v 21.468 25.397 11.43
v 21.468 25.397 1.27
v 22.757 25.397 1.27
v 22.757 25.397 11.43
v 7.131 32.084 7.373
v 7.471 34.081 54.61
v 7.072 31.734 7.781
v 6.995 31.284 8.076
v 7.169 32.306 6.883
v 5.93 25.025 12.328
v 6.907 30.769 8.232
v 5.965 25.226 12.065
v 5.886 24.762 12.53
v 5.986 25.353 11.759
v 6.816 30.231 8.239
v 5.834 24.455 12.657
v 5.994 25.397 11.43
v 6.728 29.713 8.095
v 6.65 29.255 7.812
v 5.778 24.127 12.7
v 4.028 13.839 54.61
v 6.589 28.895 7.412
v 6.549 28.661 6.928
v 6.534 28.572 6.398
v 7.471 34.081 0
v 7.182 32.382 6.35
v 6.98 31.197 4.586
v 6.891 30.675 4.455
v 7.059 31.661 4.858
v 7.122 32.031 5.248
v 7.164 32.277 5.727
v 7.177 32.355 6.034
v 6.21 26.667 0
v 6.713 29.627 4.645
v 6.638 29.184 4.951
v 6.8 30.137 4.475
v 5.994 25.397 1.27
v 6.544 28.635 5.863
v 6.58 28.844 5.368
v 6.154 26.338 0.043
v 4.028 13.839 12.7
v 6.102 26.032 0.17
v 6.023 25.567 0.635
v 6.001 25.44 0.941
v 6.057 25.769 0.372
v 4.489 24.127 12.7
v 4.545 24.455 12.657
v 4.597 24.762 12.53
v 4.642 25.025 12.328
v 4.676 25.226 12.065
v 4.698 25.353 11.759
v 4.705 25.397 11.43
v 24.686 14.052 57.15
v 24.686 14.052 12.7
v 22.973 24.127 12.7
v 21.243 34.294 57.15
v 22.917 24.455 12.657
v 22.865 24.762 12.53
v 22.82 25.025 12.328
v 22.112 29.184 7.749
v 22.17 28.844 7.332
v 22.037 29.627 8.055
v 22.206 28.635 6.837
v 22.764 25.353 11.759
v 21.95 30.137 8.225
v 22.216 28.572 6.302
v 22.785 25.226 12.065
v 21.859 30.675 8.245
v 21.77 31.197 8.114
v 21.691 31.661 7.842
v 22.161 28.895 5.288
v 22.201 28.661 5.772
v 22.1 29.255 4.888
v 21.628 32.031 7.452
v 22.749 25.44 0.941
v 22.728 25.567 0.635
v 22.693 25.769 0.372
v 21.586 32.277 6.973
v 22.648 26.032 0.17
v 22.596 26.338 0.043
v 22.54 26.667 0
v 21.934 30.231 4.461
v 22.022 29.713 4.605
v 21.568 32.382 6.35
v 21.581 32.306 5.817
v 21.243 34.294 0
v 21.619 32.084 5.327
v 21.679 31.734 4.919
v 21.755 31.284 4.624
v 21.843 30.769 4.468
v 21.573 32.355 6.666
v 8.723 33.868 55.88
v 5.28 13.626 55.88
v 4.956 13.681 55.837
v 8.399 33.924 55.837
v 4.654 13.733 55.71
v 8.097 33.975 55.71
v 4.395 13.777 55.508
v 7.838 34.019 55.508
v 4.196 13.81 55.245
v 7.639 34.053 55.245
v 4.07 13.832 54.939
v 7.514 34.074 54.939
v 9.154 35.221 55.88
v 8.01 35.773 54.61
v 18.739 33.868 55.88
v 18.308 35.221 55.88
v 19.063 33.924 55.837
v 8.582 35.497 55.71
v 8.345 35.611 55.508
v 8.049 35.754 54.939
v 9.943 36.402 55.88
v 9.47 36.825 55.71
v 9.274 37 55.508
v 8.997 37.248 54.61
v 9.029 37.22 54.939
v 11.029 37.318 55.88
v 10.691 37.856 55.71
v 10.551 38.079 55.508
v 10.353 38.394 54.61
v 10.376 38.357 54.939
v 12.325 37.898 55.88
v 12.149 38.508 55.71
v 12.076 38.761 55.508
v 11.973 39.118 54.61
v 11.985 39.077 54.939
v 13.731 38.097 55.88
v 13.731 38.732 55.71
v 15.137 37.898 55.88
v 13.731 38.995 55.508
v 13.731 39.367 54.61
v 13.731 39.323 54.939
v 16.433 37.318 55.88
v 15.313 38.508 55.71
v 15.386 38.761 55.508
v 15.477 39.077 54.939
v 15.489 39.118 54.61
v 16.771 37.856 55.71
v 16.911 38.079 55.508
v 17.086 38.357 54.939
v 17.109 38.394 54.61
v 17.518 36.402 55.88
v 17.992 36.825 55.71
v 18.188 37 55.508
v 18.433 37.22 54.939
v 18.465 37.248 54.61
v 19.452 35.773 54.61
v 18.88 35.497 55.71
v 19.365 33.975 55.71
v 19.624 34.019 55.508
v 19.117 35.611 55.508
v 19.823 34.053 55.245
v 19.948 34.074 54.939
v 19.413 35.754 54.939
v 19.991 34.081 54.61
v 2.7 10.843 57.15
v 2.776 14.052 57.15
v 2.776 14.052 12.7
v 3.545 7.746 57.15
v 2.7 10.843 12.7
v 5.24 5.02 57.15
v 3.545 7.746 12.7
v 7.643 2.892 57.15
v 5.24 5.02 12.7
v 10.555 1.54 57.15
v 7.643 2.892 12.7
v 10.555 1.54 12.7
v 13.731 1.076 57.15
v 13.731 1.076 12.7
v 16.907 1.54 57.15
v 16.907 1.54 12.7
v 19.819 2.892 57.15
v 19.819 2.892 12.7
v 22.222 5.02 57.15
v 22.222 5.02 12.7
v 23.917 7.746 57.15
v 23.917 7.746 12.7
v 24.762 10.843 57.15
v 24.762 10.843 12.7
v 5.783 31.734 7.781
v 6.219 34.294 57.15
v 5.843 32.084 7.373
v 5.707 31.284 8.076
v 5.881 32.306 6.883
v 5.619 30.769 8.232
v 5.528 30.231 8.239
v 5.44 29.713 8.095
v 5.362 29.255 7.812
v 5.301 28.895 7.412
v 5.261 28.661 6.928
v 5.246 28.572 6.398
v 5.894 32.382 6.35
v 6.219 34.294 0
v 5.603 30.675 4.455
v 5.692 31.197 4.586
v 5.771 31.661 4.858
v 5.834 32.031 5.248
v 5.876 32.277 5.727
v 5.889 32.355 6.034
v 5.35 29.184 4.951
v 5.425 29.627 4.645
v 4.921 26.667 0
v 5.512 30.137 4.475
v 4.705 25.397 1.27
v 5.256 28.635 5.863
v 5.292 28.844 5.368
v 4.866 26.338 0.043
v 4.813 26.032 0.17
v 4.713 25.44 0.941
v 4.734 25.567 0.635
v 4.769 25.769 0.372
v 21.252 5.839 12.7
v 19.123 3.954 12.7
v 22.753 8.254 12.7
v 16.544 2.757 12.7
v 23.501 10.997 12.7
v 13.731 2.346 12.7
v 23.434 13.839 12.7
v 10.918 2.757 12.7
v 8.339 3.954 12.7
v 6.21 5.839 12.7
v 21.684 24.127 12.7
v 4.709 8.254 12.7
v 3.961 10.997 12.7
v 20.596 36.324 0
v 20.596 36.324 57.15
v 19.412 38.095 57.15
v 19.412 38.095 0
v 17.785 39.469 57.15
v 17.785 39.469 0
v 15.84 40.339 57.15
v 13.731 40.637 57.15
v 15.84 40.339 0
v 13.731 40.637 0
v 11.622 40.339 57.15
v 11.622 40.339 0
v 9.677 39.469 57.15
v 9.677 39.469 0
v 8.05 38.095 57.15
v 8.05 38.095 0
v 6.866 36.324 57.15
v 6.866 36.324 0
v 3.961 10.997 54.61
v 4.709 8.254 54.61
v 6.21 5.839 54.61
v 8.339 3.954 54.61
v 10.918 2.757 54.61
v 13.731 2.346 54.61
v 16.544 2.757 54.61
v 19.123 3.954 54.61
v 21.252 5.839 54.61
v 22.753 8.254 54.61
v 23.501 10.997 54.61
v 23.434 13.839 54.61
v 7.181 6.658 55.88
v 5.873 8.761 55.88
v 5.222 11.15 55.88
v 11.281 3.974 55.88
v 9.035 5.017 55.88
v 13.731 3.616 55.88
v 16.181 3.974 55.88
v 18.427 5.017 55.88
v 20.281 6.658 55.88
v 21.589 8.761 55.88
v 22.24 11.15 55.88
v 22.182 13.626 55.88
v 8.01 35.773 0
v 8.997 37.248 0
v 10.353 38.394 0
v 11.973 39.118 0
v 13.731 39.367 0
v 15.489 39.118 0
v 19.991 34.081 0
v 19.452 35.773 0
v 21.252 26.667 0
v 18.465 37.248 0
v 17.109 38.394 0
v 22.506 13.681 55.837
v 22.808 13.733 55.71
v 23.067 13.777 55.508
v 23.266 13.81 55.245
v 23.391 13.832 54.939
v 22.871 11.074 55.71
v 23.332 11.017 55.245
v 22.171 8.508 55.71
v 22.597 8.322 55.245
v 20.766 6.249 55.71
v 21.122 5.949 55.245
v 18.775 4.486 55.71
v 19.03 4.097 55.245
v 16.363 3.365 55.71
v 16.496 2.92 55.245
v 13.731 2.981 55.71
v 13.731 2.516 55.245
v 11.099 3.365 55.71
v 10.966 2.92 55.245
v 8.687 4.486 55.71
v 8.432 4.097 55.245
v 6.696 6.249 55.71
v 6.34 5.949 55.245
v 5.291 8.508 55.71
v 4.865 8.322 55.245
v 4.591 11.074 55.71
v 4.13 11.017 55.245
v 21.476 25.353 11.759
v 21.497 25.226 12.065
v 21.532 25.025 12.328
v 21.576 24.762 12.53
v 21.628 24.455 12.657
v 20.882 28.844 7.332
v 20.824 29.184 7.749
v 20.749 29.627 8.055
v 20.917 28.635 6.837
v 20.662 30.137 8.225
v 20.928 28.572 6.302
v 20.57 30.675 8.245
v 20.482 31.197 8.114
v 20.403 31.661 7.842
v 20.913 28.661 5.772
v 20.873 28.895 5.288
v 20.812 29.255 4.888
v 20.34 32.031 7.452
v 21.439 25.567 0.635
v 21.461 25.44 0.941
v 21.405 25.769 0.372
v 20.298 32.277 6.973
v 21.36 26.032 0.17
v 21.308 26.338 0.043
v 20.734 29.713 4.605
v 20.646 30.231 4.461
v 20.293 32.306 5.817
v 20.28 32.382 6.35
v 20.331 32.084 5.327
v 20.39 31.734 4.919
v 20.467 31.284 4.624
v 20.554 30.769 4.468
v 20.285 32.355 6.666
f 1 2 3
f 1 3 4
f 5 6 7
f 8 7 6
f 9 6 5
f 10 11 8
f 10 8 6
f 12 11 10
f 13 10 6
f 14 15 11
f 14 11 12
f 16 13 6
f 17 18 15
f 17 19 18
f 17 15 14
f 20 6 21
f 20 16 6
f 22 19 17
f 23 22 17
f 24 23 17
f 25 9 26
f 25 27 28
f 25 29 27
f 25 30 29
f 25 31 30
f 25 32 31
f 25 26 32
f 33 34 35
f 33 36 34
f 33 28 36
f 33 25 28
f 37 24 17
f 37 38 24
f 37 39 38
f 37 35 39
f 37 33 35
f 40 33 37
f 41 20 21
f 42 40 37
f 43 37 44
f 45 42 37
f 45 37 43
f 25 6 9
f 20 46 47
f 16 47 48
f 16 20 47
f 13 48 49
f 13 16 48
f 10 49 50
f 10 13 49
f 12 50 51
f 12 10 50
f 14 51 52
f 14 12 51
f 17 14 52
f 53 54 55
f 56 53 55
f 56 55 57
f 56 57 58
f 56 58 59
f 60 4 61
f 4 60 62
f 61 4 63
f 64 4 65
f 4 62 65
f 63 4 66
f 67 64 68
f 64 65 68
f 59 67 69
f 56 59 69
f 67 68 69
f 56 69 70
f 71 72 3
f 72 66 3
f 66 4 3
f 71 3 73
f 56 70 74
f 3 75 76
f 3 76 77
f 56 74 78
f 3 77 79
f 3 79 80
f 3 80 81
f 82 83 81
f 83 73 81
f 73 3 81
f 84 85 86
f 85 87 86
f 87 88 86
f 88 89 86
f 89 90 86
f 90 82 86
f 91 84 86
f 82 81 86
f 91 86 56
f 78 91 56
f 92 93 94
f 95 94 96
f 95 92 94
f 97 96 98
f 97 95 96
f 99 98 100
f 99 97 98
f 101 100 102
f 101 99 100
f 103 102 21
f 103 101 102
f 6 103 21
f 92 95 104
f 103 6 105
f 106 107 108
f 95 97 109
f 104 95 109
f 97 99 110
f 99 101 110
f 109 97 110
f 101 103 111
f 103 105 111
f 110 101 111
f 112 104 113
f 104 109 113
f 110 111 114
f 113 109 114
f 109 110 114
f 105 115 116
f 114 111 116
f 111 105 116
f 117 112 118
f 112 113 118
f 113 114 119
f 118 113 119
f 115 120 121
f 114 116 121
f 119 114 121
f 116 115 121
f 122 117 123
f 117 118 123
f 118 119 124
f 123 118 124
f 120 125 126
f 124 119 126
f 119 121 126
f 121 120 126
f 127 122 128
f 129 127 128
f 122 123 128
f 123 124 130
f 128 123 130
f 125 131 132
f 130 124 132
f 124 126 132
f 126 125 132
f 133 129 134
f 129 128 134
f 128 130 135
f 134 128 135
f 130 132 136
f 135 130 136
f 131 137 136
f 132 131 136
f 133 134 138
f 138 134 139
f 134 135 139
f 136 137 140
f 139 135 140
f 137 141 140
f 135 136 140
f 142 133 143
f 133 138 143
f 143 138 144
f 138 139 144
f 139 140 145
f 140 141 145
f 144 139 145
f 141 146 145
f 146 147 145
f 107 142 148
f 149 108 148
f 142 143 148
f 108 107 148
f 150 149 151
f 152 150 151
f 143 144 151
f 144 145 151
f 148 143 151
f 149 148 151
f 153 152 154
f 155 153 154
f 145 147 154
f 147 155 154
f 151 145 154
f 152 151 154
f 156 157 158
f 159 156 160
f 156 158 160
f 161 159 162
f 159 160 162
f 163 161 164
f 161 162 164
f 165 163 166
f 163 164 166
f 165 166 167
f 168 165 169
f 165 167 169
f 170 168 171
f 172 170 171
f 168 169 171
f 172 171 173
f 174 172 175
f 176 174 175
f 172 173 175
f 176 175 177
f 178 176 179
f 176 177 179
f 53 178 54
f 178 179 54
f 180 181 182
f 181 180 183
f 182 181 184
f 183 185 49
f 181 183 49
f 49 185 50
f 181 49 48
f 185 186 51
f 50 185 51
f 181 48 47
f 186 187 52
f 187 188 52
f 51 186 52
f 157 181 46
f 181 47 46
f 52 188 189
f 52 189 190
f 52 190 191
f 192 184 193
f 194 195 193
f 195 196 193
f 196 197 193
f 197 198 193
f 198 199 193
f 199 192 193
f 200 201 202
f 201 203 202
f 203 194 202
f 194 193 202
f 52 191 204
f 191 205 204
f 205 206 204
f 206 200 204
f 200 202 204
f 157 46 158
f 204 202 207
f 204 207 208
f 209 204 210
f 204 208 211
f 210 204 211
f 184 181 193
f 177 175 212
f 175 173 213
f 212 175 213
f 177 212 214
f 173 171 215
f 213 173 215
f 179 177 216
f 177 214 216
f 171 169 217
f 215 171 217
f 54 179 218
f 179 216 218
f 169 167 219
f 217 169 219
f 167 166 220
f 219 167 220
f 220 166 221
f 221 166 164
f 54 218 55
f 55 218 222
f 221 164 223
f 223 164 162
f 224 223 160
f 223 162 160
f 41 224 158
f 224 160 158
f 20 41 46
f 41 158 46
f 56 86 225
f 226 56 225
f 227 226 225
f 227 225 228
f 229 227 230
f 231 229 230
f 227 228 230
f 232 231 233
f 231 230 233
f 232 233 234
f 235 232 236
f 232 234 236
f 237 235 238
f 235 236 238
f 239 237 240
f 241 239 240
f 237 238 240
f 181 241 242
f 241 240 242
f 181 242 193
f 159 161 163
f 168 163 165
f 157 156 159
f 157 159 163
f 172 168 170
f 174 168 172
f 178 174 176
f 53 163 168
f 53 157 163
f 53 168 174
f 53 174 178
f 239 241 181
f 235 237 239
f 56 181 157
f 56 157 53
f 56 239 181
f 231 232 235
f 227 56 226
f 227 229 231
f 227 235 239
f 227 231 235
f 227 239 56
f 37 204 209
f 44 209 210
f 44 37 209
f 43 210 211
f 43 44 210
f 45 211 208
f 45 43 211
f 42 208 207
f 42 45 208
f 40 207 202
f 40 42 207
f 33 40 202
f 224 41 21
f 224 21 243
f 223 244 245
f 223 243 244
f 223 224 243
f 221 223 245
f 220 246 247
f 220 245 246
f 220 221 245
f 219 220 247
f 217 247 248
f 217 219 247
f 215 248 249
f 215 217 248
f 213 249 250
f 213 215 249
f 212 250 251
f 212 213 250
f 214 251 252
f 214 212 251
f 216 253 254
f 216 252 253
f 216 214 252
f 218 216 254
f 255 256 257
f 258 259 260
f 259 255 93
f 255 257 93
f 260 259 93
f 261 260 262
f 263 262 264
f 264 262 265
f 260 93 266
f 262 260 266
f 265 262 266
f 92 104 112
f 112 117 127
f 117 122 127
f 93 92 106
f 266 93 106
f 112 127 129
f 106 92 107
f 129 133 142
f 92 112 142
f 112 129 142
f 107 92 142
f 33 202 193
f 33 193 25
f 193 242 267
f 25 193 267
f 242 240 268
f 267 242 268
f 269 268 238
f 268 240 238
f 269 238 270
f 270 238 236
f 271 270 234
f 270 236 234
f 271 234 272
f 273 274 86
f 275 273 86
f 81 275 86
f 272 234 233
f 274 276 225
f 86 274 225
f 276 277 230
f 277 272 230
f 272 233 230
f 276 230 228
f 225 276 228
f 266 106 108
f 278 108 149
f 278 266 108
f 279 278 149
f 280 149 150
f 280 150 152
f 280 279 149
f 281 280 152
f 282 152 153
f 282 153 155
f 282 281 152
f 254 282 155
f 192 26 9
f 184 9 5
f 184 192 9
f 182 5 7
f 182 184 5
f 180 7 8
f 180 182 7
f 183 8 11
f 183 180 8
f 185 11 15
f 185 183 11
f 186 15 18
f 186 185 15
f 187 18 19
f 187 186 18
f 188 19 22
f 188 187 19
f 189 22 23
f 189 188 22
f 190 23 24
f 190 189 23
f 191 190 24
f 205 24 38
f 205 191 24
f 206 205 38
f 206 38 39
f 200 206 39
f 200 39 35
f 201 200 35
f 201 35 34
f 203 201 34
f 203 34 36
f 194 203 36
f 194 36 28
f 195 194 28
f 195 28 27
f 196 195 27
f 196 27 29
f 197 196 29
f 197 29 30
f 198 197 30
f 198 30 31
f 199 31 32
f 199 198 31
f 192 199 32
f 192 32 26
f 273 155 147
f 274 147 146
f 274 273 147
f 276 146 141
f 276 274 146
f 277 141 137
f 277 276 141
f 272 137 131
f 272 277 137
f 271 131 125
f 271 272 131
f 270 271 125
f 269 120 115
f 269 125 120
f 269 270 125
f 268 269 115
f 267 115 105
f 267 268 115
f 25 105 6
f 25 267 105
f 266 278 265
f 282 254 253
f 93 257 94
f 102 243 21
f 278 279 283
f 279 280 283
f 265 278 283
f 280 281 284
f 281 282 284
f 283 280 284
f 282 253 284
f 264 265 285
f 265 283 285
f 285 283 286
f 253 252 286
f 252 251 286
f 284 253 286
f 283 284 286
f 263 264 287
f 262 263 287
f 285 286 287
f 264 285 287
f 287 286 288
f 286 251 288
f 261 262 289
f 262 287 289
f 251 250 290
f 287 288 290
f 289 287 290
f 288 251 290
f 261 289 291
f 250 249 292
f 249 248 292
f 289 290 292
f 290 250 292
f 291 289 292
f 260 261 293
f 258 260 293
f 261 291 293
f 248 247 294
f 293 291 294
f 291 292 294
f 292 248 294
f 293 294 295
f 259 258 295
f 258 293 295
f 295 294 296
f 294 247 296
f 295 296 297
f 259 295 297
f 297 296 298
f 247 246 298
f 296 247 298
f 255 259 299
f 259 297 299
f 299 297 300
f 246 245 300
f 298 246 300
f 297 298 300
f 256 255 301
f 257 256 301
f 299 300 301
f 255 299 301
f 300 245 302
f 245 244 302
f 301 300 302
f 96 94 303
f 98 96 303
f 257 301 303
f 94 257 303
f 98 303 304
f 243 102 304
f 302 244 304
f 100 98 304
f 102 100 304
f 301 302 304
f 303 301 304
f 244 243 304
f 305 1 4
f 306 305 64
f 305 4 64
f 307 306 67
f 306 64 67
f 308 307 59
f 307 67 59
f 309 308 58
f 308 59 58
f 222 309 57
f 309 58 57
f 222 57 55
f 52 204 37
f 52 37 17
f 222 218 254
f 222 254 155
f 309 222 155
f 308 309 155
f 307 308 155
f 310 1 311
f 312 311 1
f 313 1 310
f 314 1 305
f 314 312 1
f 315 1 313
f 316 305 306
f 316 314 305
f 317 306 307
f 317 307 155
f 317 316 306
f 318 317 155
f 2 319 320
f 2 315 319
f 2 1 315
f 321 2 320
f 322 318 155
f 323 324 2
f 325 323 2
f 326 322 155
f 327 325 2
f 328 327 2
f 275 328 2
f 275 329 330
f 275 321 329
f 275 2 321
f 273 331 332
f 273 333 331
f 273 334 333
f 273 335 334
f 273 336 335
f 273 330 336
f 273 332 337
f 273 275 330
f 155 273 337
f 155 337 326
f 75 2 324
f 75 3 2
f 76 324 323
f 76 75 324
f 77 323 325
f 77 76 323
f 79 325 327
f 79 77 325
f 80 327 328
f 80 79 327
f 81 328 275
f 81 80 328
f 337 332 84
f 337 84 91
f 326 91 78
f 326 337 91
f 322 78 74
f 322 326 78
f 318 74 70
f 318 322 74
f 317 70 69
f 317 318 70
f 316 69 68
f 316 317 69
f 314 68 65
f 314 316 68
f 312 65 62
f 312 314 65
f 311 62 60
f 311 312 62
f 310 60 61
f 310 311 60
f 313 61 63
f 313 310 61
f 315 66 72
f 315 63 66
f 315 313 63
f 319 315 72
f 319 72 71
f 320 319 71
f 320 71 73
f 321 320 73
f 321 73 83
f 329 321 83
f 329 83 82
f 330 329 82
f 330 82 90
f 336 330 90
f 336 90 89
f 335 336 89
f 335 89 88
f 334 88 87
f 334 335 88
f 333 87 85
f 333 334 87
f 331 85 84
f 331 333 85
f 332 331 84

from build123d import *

# Parameters (mm, degrees)
F1_DEPTH = 57.15
F2_T     = -1.27
F3_W     = 24.3205
F3_H     = 12.7
F3_R     = 1.905
F4_DEPTH = 24.8444639078
F5_R     = 1.27


with BuildPart() as f1:
    # F0 (on Top) → F1 (new body)
    with BuildSketch(Plane.XY):
        with BuildLine():
            Line((6.2188556471, 34.2943200643), (2.7758060277, 14.0519526863))
            ThreePointArc((2.7758060277, 14.0519526863), (13.7309639078, 1.0760761619), (24.6861217879, 14.0519526863))
            Line((24.6861217879, 14.0519526863), (21.2430721684, 34.2943200643))
            ThreePointArc((21.2430721684, 34.2943200643), (13.7309639078, 40.6365761619), (6.2188556471, 34.2943200643))
        make_face()
    extrude(amount=F1_DEPTH)

    # F2
    f2_openings = [f1.faces().sort_by_distance(p)[0] for p in [
        (13.730964, 19.748404, 0),
    ]]
    offset(amount=F2_T, openings=f2_openings)

    # F3 (on Right) → F4 (cut, through all)
    with BuildSketch(Plane.YZ):
        with Locations((13.2363261619, 6.35)):
            Rectangle(F3_W, F3_H)
        with Locations((30.4765761619, 6.35)):
            Circle(F3_R)
    extrude(amount=F4_DEPTH, mode=Mode.SUBTRACT)

    # F5
    f5_edges = [f1.edges().sort_by_distance(p)[0] for p in [
        (5.349547, 25.396576, 12.7),
        (22.11238, 25.396576, 12.7),
        (5.349547, 25.396576, 0),
        (22.11238, 25.396576, 0),
        (13.730964, 2.346076, 55.88),
        (21.712579, 23.960179, 55.88),
        (13.730964, 39.366576, 55.88),
        (5.749349, 23.960179, 55.88),
    ]]
    fillet(f5_edges, radius=F5_R)


solid = f1.part
